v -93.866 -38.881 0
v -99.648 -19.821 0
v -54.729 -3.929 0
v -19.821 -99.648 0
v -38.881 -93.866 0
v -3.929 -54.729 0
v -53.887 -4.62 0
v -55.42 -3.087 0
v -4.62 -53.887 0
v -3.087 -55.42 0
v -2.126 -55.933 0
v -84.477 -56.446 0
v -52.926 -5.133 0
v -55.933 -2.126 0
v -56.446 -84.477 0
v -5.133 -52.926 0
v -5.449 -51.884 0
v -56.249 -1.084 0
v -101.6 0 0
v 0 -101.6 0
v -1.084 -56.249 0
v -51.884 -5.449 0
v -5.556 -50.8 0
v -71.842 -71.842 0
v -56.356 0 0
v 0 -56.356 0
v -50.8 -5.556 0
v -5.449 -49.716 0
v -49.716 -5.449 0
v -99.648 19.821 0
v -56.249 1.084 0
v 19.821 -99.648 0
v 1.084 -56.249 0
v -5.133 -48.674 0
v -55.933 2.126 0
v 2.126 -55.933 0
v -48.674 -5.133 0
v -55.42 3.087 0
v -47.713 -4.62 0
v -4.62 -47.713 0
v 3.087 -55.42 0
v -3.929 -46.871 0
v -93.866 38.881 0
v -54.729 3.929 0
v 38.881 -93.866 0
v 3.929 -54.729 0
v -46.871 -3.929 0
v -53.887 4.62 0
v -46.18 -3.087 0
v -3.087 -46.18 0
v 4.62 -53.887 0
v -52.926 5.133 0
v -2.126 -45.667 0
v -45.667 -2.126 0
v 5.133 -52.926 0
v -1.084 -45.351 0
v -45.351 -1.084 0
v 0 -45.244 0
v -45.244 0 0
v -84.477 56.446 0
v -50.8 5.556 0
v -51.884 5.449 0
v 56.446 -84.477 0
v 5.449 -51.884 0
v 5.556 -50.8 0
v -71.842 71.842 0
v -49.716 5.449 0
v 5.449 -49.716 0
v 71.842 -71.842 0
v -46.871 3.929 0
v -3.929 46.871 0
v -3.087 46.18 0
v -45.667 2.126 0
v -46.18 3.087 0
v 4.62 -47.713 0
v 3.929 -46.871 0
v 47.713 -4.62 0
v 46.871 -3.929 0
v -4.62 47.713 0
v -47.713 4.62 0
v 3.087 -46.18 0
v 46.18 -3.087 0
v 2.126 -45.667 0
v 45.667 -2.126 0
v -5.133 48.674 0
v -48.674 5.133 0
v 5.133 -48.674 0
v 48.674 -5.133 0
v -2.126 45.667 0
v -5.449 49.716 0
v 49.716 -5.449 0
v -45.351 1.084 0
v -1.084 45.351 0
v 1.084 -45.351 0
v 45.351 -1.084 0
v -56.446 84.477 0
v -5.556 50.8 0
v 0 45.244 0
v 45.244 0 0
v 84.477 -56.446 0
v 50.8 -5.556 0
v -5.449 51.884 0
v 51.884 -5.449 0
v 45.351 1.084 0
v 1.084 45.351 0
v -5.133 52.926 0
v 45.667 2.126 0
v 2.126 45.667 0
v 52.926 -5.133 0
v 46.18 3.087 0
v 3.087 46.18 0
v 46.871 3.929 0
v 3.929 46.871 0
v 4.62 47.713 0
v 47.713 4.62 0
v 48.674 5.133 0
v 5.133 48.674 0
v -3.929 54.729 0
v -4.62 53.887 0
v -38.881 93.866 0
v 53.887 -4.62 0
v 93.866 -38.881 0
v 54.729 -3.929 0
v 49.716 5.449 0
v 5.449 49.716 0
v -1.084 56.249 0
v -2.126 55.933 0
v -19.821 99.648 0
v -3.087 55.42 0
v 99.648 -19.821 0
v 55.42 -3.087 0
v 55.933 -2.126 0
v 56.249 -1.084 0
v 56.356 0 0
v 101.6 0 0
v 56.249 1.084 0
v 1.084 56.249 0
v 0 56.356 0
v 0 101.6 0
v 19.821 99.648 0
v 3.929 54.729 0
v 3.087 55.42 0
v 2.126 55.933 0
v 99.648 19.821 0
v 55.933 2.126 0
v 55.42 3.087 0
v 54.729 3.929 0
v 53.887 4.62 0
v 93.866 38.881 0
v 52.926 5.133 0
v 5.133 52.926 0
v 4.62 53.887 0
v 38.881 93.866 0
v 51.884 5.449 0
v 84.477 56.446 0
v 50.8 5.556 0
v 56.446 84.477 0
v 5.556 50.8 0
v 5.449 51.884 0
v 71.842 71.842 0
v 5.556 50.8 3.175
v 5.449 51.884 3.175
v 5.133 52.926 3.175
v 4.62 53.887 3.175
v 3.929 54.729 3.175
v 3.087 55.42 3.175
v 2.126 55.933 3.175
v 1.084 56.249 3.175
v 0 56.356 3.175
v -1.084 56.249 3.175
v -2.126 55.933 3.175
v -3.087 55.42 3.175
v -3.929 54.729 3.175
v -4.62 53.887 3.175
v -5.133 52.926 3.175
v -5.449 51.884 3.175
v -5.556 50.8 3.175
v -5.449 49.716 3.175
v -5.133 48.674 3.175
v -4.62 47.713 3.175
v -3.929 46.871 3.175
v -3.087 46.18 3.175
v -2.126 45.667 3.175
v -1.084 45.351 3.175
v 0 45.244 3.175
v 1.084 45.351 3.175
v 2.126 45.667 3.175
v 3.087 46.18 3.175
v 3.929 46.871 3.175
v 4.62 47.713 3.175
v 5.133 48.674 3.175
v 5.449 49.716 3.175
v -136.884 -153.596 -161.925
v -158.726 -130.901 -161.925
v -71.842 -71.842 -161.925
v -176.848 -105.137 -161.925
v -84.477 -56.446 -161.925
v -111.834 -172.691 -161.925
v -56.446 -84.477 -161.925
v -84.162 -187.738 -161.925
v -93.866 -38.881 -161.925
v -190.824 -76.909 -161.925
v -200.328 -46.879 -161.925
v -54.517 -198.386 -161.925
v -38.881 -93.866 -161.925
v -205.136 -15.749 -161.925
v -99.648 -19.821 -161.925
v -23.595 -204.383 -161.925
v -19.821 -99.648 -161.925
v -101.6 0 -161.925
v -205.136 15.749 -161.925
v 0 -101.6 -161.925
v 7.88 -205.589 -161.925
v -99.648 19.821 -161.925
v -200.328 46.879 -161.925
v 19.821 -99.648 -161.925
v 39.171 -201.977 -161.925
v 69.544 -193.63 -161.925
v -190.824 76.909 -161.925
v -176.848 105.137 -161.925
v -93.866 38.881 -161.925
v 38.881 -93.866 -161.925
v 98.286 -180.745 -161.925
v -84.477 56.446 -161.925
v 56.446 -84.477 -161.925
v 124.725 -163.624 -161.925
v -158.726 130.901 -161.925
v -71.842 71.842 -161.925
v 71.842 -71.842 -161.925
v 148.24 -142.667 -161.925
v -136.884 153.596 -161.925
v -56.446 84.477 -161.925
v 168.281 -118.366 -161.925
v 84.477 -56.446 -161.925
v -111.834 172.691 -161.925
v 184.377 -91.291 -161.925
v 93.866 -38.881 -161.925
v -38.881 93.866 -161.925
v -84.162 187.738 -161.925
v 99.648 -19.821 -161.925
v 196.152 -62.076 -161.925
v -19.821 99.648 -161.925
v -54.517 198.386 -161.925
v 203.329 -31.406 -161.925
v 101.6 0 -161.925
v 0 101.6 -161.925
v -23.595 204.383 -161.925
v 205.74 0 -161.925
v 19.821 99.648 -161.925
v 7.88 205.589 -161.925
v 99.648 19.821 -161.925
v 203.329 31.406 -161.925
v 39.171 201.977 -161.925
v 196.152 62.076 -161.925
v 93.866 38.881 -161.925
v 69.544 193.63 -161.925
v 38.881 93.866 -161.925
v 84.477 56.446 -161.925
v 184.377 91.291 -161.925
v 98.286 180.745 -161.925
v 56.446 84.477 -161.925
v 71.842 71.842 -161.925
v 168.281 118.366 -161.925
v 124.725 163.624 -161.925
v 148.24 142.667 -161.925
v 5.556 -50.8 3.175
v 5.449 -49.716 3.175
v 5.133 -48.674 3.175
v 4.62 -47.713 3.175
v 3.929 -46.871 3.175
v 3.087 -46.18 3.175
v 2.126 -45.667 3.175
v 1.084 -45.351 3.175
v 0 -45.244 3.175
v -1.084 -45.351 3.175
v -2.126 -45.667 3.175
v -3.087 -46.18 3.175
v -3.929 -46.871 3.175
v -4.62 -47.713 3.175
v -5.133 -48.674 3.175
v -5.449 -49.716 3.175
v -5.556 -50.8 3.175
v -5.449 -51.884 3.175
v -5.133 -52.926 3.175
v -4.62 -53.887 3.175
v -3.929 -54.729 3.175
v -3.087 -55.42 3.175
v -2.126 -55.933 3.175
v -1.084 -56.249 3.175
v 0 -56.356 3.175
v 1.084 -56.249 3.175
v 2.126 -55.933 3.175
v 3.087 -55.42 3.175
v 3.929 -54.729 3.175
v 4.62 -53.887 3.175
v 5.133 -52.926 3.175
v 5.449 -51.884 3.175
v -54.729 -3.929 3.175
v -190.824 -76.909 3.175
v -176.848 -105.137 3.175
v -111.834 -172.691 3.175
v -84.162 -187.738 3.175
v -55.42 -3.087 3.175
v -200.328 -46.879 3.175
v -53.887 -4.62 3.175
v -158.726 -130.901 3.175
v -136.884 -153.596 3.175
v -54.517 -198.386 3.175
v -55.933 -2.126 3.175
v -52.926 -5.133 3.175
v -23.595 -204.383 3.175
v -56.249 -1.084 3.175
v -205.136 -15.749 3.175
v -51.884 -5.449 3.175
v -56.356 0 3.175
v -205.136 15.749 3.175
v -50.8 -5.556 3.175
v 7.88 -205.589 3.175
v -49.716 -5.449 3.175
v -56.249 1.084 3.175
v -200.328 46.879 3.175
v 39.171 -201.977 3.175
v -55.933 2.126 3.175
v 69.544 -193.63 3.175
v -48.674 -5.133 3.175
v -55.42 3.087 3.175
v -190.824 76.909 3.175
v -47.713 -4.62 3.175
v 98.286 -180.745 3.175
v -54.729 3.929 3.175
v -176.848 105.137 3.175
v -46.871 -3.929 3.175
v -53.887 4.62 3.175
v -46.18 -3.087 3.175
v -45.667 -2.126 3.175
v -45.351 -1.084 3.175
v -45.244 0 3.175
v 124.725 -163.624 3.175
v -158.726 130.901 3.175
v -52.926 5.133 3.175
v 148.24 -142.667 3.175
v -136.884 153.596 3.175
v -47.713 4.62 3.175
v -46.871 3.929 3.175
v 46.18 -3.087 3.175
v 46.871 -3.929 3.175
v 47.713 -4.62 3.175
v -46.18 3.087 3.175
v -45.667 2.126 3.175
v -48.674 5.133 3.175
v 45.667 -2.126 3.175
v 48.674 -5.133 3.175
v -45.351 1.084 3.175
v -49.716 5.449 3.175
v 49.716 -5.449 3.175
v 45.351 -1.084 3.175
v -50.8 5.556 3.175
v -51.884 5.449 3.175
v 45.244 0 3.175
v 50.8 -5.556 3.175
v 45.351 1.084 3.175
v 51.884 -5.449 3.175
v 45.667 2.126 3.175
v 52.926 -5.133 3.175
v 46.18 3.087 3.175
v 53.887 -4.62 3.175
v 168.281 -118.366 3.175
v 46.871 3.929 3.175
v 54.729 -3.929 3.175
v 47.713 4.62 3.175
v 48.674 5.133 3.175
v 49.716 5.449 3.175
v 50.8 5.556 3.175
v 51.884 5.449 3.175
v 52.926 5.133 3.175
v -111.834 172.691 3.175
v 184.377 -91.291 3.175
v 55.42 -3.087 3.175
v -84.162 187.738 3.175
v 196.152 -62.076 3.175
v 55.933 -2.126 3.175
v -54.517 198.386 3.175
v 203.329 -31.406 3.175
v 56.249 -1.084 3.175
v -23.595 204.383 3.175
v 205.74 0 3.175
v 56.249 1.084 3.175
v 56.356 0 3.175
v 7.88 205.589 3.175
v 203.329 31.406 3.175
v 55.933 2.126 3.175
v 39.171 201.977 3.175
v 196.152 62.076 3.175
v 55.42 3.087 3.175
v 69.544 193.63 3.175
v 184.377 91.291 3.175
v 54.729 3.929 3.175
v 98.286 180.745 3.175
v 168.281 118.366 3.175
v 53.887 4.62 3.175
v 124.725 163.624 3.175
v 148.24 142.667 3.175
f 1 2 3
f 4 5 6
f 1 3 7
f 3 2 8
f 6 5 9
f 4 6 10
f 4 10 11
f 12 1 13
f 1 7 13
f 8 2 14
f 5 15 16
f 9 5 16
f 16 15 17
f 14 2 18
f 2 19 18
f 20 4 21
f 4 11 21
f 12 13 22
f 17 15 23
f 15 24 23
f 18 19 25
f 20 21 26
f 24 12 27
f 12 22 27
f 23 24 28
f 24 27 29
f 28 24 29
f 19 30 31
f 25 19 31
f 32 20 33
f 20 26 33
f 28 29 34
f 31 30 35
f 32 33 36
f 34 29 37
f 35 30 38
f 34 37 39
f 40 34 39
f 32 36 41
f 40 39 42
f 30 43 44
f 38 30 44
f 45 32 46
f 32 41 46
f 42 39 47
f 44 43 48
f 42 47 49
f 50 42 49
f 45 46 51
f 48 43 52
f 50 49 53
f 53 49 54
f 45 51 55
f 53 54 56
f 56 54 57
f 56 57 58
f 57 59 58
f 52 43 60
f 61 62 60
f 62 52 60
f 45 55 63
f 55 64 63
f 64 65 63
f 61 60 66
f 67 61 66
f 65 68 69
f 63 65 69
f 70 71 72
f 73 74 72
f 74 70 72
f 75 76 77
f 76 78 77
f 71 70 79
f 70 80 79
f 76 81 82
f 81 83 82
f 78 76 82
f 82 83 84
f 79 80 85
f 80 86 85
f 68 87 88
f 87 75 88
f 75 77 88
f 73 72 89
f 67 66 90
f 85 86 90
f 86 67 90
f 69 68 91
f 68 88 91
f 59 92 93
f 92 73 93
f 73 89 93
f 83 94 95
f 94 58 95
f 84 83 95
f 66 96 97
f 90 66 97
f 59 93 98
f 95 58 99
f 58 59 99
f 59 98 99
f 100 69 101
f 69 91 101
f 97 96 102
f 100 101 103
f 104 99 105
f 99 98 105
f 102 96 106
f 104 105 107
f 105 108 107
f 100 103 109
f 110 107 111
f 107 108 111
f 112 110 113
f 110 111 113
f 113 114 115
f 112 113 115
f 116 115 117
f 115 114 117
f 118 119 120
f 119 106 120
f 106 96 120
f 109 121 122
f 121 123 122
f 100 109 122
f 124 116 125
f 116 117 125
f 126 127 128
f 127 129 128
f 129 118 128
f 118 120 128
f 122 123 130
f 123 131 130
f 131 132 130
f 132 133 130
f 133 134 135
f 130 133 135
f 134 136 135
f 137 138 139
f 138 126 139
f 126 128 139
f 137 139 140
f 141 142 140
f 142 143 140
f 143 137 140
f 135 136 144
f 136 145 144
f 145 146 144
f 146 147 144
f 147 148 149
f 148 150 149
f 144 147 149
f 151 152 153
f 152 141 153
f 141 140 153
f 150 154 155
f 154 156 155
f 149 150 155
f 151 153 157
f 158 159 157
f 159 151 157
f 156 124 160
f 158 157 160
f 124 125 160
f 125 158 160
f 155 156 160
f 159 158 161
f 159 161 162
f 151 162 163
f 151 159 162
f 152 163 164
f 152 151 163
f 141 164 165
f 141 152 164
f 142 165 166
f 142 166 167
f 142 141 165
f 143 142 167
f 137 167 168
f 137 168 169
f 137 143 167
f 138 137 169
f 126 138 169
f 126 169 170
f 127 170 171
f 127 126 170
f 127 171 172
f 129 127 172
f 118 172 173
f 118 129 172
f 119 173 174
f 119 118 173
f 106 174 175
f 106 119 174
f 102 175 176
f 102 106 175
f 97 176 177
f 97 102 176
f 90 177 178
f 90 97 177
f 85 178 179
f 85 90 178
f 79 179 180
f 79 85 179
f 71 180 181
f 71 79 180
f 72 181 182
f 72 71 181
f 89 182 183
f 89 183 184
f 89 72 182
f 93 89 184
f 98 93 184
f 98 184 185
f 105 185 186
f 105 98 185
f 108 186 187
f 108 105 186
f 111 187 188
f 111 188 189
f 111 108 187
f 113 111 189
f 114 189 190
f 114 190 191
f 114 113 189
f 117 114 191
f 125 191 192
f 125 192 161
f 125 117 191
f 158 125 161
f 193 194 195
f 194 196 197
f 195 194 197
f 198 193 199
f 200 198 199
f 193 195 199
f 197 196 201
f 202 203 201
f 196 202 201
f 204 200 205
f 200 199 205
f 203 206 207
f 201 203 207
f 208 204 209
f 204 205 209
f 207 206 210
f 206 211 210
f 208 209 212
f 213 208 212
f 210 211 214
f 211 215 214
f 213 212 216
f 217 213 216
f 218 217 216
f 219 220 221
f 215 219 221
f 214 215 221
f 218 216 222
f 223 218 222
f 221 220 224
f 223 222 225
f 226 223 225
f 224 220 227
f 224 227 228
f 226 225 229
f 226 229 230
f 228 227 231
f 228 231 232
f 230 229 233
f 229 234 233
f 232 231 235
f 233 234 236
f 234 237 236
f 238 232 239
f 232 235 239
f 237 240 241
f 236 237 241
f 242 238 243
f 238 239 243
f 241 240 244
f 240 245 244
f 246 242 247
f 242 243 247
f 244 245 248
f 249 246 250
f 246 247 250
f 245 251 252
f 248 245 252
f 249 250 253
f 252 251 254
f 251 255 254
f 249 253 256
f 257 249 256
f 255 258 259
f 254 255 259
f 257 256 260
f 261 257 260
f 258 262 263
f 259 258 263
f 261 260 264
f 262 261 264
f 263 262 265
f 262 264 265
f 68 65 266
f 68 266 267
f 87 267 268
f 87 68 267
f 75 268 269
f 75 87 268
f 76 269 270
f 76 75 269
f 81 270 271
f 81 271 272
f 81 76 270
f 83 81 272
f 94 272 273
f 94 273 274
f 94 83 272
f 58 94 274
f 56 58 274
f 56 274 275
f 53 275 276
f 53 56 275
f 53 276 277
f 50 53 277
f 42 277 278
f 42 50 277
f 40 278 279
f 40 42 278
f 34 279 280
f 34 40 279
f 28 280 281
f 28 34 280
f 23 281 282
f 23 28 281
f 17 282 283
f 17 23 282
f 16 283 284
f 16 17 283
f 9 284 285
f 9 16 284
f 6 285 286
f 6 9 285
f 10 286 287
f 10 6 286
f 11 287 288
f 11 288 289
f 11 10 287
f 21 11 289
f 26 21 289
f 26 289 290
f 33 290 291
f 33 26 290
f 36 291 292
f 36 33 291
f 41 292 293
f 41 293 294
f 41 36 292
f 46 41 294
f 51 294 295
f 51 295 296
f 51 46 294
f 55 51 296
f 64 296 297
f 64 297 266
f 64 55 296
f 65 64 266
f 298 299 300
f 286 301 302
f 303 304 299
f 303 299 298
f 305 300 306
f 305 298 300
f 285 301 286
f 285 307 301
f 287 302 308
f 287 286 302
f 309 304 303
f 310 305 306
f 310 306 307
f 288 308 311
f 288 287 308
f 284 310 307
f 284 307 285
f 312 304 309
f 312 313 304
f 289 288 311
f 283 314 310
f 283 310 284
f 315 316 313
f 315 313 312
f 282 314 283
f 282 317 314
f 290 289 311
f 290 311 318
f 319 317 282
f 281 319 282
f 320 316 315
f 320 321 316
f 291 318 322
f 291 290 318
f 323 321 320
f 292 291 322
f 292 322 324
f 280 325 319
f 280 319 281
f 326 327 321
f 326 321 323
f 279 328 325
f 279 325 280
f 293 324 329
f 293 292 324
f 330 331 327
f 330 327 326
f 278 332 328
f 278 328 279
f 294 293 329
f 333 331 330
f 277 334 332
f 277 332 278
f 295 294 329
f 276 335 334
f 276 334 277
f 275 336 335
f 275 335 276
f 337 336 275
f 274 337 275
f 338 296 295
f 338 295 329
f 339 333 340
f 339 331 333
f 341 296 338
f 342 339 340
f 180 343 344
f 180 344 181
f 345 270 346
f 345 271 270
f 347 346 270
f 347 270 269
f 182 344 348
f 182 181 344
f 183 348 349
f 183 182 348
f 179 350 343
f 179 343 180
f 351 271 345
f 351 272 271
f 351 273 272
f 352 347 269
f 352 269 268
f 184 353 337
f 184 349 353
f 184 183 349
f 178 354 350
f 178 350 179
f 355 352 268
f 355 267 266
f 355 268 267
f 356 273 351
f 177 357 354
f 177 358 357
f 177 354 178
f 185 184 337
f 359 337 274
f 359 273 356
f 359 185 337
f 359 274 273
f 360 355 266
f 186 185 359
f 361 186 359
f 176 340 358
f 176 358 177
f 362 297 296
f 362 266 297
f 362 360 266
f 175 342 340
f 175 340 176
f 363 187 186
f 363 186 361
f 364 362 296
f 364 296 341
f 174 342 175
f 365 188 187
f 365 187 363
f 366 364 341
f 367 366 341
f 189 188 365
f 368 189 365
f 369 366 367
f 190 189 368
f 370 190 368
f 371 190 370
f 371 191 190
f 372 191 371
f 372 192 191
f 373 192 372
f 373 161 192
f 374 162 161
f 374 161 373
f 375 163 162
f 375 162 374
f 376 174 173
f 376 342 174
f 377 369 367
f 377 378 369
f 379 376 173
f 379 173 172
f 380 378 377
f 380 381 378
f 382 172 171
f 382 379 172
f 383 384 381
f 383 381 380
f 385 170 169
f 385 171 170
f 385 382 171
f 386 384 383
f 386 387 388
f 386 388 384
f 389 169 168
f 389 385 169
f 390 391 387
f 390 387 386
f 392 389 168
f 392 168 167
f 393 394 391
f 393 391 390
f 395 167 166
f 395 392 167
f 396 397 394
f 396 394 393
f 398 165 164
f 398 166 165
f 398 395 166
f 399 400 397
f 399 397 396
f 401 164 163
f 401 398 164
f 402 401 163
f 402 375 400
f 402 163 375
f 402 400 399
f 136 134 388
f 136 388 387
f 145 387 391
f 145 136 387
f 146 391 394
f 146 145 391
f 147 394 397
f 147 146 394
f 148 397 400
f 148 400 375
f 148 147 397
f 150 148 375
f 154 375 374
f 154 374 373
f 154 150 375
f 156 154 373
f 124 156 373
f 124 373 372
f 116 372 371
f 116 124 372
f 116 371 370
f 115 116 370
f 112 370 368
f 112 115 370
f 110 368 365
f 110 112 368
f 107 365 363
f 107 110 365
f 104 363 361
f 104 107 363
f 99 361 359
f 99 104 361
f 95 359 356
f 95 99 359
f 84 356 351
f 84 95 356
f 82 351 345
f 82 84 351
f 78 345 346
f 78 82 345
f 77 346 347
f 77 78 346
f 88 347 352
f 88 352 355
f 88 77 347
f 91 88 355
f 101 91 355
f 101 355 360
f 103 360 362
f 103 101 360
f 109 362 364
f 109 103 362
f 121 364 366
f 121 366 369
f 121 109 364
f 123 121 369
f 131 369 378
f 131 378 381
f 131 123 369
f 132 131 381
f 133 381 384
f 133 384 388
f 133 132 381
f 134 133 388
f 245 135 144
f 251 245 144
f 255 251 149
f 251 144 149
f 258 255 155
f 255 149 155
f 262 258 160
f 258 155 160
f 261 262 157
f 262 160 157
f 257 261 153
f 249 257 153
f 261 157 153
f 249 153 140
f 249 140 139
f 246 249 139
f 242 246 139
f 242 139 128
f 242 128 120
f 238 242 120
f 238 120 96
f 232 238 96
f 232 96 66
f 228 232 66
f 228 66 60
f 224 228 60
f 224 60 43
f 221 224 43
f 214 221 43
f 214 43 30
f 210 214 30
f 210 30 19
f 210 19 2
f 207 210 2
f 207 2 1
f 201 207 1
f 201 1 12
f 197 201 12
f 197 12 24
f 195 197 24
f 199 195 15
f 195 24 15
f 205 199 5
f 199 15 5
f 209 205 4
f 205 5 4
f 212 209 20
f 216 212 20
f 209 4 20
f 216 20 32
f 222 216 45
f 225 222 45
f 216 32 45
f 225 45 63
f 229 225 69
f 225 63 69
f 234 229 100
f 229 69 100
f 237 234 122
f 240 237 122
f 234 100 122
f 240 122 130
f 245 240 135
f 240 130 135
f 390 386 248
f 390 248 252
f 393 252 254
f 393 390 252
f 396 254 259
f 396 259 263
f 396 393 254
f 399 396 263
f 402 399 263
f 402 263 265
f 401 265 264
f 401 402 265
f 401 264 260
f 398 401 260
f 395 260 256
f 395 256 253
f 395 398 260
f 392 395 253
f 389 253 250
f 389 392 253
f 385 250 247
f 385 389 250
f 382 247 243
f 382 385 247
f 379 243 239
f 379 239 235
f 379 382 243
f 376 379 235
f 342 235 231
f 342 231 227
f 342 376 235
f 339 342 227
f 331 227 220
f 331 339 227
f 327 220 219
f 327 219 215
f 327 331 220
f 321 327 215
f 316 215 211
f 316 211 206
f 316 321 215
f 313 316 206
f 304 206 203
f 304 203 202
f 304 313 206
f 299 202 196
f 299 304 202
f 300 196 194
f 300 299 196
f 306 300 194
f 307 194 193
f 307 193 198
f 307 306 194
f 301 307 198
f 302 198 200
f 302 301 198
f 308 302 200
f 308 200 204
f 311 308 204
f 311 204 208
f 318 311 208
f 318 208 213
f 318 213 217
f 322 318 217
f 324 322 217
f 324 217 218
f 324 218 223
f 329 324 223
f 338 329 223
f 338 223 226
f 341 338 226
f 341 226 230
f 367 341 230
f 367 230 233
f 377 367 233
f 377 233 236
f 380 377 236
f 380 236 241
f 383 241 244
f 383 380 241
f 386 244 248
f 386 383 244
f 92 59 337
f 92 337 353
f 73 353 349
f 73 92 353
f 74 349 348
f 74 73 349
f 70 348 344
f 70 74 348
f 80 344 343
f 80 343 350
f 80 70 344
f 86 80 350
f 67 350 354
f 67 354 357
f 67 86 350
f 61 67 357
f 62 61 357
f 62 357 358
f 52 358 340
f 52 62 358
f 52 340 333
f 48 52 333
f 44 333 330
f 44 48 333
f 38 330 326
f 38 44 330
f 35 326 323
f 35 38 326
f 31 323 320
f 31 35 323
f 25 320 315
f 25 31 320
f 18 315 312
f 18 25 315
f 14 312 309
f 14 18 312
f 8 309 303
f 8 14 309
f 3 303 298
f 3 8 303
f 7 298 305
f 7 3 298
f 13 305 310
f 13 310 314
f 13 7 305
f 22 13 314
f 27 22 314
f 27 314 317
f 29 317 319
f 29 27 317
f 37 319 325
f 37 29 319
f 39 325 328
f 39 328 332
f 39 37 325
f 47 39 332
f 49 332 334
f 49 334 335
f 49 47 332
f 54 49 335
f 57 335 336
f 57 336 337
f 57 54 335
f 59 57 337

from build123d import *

# Parameters (mm, degrees)
SKETCH1_R           = 101.6
SKETCH1_R_2         = 5.55625
BOSS_EXTRUDE2_DEPTH = 3.175
SKETCH2_R           = 205.74
SKETCH2_R_2         = 101.6
BOSS_EXTRUDE3_DEPTH = 165.1


with BuildPart() as part:
    # Sketch1 → Boss-Extrude2 (new body)
    with BuildSketch(Plane.XY):
        Circle(SKETCH1_R)
        with Locations((0, 50.8)):
            Circle(SKETCH1_R_2, mode=Mode.SUBTRACT)
        with Locations((50.8, 0)):
            Circle(SKETCH1_R_2, mode=Mode.SUBTRACT)
        with Locations((0, -50.8)):
            Circle(SKETCH1_R_2, mode=Mode.SUBTRACT)
        with Locations((-50.8, 0)):
            Circle(SKETCH1_R_2, mode=Mode.SUBTRACT)
    extrude(amount=BOSS_EXTRUDE2_DEPTH)

    # Sketch2 → Boss-Extrude3 (add)
    with BuildSketch(Plane.XY.offset(3.175)):
        Circle(SKETCH2_R)
        Circle(SKETCH2_R_2, mode=Mode.SUBTRACT)
    extrude(amount=-BOSS_EXTRUDE3_DEPTH)


solid = part.part
